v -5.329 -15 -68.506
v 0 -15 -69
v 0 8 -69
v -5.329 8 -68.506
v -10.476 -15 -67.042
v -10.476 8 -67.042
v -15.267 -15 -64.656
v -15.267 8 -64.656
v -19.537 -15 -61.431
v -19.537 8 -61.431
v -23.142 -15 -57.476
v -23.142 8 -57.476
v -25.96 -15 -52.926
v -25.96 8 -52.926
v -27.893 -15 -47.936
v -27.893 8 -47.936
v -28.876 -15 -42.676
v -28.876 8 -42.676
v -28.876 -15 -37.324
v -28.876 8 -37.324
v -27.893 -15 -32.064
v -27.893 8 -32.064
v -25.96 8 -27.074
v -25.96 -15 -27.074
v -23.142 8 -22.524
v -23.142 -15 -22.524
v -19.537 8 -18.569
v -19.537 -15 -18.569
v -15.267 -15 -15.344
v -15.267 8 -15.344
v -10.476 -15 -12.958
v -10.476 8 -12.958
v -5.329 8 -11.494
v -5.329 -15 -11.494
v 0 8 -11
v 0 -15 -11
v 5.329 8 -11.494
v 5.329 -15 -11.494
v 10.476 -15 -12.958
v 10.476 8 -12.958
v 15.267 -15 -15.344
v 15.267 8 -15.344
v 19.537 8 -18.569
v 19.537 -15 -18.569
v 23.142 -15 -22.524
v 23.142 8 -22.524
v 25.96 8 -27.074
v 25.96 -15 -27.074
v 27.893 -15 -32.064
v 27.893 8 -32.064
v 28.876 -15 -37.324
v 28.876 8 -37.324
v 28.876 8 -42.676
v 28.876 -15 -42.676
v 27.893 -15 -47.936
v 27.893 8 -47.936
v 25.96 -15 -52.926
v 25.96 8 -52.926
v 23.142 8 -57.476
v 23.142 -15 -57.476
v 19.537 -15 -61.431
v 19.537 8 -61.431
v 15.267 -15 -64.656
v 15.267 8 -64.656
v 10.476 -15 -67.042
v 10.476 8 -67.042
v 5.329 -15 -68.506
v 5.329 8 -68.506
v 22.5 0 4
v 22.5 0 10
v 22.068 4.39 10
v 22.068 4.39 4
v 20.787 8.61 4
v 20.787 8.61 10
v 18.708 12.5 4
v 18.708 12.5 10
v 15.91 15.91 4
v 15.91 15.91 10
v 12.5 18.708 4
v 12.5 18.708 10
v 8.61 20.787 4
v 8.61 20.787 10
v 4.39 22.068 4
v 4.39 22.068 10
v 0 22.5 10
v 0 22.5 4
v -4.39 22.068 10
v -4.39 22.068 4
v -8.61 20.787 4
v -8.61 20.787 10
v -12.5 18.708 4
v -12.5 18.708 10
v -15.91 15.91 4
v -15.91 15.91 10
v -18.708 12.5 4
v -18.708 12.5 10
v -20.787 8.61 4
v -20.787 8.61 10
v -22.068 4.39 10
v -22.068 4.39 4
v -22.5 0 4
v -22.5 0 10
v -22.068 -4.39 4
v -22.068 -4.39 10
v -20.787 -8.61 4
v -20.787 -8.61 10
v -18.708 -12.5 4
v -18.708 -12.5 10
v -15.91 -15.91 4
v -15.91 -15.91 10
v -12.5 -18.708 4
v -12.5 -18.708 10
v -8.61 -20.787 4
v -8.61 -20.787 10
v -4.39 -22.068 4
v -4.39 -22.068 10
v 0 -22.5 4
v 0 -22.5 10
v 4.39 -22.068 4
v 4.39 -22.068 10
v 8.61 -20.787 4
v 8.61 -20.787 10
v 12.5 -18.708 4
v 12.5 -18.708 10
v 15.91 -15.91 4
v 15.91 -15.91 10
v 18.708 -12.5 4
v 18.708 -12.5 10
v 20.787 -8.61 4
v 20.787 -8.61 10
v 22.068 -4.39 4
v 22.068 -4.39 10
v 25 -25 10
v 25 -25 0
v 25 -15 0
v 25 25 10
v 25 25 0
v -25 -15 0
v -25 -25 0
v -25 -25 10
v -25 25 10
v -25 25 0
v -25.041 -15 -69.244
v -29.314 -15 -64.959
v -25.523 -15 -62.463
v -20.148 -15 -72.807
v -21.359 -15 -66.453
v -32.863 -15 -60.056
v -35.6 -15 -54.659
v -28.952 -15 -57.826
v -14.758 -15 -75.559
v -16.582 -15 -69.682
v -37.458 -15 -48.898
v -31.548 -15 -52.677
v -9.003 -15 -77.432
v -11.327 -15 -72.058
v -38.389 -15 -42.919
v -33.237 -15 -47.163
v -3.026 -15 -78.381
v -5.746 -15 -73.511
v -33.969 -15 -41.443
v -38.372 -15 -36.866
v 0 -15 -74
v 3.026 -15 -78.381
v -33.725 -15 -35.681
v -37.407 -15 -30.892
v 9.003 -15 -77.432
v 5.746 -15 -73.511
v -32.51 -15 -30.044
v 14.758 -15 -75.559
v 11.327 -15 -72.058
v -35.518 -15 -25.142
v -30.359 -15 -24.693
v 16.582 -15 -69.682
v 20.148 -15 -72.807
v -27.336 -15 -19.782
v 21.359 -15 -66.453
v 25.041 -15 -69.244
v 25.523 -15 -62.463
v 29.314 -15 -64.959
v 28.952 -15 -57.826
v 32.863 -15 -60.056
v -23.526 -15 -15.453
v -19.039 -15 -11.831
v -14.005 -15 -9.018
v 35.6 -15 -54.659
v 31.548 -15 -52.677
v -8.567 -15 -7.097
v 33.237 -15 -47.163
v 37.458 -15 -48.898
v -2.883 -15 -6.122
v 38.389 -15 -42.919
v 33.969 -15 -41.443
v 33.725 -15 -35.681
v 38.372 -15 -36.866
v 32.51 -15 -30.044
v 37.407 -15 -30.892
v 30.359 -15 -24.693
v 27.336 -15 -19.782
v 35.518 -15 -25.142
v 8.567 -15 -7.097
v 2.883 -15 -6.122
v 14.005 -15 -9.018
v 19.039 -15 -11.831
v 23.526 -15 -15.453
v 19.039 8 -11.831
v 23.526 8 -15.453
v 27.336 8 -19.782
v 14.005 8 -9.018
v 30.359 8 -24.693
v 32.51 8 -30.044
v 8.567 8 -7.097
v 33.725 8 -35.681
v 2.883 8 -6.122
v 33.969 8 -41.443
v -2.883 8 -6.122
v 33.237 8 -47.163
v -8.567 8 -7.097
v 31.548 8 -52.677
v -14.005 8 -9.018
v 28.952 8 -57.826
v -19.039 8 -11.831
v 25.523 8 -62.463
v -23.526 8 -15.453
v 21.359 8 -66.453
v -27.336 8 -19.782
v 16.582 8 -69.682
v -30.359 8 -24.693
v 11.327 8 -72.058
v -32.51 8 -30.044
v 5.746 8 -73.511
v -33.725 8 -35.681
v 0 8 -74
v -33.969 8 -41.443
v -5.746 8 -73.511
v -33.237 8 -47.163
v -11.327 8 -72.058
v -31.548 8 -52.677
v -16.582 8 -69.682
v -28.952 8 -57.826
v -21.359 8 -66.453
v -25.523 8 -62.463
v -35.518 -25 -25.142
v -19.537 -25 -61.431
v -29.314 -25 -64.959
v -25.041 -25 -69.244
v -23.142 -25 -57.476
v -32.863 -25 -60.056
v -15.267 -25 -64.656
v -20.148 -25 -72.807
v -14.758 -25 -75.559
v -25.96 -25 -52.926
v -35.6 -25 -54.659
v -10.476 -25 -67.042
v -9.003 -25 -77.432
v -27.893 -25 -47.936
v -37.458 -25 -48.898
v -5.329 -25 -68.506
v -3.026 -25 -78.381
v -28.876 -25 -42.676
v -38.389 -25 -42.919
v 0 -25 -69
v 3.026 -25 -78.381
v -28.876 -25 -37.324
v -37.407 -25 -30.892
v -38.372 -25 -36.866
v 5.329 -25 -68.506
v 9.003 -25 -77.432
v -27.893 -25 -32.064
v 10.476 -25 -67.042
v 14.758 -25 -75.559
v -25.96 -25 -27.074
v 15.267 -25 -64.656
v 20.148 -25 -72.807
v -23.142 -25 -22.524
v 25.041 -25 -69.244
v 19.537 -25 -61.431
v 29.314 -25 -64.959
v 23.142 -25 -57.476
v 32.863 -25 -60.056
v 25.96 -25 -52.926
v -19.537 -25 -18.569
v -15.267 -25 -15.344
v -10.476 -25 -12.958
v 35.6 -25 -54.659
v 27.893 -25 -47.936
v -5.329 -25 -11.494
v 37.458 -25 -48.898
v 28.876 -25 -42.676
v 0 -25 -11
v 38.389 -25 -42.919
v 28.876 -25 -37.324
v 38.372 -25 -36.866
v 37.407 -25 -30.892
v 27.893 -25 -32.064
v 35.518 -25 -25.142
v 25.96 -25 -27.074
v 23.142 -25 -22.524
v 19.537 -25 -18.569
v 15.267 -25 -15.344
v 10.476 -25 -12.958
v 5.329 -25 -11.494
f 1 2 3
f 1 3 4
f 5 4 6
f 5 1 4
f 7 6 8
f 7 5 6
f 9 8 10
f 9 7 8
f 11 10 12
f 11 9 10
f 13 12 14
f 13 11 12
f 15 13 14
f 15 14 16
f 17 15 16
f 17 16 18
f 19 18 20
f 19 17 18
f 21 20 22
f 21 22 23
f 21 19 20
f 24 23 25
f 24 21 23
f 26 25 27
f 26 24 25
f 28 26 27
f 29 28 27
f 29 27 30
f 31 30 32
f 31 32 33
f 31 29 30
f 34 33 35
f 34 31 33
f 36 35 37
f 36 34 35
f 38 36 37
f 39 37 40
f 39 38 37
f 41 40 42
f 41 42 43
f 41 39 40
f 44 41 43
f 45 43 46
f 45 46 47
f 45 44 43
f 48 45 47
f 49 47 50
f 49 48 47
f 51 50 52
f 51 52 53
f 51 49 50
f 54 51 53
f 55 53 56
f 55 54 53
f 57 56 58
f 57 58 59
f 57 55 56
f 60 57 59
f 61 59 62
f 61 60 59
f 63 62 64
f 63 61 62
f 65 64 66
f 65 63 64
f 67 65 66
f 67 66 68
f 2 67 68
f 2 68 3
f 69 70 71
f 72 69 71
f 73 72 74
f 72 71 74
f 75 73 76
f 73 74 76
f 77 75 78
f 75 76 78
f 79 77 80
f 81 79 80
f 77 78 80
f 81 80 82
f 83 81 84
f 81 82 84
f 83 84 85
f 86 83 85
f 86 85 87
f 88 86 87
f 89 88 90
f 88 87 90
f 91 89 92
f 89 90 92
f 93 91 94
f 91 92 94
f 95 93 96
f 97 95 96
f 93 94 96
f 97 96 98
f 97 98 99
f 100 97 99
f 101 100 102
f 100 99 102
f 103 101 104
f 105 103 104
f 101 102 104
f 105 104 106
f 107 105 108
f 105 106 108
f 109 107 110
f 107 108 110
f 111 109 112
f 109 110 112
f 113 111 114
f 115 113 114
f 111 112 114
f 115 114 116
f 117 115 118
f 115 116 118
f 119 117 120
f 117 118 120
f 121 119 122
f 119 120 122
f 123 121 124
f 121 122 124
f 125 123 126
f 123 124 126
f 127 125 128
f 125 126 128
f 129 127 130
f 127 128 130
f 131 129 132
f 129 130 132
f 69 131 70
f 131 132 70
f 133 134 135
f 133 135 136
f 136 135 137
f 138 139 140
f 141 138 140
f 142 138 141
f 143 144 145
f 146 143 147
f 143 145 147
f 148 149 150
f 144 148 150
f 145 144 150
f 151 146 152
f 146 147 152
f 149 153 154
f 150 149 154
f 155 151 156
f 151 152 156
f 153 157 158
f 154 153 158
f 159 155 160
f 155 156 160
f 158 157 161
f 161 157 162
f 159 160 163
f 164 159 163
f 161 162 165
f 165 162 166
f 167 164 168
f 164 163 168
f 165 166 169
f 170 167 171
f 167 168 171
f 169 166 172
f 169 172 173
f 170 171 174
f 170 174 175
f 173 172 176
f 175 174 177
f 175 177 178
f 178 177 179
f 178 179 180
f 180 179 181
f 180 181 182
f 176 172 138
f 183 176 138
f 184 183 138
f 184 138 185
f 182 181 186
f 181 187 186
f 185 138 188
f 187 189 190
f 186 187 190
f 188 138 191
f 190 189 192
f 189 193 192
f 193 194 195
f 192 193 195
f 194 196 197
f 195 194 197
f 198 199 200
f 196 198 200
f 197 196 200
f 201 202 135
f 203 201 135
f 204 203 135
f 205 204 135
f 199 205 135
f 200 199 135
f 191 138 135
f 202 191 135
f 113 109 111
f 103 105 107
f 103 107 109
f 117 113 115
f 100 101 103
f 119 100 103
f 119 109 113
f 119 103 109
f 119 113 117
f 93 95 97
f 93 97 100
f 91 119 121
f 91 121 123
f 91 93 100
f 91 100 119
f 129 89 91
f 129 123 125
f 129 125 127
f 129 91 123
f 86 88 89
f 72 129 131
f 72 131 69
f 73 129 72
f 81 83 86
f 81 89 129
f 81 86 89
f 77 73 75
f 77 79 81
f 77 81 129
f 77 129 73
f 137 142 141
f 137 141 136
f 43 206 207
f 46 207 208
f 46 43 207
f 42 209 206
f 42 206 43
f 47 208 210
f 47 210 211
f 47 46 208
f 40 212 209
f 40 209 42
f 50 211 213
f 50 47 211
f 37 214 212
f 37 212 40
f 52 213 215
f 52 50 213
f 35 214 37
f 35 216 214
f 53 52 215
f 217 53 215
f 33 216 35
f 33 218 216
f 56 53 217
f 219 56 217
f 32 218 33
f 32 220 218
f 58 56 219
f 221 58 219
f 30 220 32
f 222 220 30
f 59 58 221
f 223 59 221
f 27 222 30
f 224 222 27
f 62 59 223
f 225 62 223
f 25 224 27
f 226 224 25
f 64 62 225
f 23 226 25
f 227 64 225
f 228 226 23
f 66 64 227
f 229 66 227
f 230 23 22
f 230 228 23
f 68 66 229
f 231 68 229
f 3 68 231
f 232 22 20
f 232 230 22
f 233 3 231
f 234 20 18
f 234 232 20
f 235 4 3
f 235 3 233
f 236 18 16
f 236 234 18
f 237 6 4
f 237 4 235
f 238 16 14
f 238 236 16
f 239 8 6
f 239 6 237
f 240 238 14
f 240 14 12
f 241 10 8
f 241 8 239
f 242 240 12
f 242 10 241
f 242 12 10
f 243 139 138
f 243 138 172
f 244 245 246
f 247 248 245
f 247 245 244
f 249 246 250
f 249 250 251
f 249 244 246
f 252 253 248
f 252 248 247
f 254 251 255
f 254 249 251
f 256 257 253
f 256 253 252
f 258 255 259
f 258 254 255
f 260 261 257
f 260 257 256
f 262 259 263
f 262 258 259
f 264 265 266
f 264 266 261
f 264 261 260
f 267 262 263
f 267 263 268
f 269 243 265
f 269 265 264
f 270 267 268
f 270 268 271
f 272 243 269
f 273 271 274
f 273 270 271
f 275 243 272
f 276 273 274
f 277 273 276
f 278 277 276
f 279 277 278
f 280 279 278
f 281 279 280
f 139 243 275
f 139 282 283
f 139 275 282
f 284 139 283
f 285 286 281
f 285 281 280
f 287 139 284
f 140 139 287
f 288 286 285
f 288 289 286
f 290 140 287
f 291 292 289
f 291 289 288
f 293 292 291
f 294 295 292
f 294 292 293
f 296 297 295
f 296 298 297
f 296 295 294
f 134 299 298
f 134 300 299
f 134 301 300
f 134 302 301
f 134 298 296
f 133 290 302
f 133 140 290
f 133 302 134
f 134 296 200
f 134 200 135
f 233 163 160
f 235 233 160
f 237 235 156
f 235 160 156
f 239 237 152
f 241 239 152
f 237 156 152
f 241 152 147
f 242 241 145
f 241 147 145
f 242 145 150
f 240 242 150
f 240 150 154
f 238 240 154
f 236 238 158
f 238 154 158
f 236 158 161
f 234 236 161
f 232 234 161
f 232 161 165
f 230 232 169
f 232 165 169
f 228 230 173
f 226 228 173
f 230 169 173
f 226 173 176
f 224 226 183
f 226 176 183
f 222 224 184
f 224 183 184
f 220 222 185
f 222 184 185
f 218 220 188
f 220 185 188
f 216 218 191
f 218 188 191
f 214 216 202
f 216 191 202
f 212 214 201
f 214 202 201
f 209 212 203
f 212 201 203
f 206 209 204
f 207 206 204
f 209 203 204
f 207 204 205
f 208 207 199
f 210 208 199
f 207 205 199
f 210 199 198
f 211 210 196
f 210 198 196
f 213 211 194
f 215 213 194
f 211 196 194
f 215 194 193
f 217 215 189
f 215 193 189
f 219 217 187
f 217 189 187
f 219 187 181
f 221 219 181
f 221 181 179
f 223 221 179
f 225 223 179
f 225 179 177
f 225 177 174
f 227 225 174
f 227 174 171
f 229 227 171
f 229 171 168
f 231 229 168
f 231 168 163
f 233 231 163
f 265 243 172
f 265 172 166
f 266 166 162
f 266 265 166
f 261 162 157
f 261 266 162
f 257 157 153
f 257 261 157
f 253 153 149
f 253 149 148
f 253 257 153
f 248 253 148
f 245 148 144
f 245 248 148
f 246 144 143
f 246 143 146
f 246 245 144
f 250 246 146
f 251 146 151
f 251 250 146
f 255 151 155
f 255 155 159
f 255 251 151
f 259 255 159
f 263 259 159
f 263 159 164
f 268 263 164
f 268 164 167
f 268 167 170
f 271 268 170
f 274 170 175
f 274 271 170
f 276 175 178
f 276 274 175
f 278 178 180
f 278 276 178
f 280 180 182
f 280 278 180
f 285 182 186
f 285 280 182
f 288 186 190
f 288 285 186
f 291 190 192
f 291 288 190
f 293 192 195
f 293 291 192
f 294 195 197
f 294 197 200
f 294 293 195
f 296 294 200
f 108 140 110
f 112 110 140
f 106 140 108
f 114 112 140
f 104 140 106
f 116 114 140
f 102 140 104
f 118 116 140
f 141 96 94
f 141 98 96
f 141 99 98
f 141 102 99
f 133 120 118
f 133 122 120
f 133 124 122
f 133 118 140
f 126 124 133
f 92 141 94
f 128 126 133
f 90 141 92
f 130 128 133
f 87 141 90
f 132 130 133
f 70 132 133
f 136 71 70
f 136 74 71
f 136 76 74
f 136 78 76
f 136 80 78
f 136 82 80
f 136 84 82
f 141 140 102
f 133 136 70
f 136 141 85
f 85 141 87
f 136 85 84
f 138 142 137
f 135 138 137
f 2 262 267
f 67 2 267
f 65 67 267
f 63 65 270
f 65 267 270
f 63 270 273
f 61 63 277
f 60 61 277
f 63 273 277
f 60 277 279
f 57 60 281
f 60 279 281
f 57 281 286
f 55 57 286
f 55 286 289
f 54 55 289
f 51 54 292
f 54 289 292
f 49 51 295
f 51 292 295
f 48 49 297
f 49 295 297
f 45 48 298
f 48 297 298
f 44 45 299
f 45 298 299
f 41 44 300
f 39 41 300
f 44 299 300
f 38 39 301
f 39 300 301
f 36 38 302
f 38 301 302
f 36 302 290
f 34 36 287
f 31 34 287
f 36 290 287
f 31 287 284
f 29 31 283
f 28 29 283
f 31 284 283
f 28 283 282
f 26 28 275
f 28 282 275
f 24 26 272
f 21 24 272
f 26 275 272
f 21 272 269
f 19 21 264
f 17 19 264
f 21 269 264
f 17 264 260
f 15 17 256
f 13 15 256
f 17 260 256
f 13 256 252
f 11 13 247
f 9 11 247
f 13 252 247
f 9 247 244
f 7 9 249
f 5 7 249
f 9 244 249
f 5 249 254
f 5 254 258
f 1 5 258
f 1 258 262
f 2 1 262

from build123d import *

# Parameters (mm, degrees)
SKETCH_1_W          = 50
SKETCH_1_H          = 50
EXTRUDE_1_DEPTH     = 10
SKETCH_2_R          = 29
EXTRUDE_2_DEPTH     = 10
SKETCH_3_R          = 22.5
CUT_EXTRUDE_1_DEPTH = 6
SKETCH_4_R          = 34
SKETCH_4_R_2        = 29
EXTRUDE_3_DEPTH     = 23


with BuildPart() as part:
    # 草图1 → 凸台-拉伸1 (new body)
    with BuildSketch(Plane.XY):
        Rectangle(SKETCH_1_W, SKETCH_1_H)
    extrude(amount=EXTRUDE_1_DEPTH)

    # 草图2 → 凸台-拉伸2 (add)
    with BuildSketch(Plane.XZ.offset(25)):
        with BuildLine():
            Line((-25, 0), (-35.517549587, -25.142218492))
            ThreePointArc((-35.517549587, -25.142218492), (0, -78.5), (35.517549587, -25.142218492))
            Line((35.517549587, -25.142218492), (25, 0))
            Line((25, 0), (-25, 0))
        make_face()
        with Locations(Location((0, -40, 0), (0, 0, 270))):
            Circle(SKETCH_2_R, mode=Mode.SUBTRACT)
    extrude(amount=-EXTRUDE_2_DEPTH)

    # 草图3 → 切除-拉伸1 (cut)
    with BuildSketch(Plane.XY.offset(10)):
        Circle(SKETCH_3_R)
    extrude(amount=-CUT_EXTRUDE_1_DEPTH, mode=Mode.SUBTRACT)

    # 草图4 → 凸台-拉伸3 (add)
    with BuildSketch(Plane(origin=(0, -15, 0), x_dir=(1, 0, 0), z_dir=(0, 1, 0))):
        with Locations(Location((0, 40, 0), (0, 0, 90))):
            Circle(SKETCH_4_R)
        with Locations(Location((0, 40, 0), (0, 0, 90))):
            Circle(SKETCH_4_R_2, mode=Mode.SUBTRACT)
    extrude(amount=EXTRUDE_3_DEPTH)


solid = part.part
